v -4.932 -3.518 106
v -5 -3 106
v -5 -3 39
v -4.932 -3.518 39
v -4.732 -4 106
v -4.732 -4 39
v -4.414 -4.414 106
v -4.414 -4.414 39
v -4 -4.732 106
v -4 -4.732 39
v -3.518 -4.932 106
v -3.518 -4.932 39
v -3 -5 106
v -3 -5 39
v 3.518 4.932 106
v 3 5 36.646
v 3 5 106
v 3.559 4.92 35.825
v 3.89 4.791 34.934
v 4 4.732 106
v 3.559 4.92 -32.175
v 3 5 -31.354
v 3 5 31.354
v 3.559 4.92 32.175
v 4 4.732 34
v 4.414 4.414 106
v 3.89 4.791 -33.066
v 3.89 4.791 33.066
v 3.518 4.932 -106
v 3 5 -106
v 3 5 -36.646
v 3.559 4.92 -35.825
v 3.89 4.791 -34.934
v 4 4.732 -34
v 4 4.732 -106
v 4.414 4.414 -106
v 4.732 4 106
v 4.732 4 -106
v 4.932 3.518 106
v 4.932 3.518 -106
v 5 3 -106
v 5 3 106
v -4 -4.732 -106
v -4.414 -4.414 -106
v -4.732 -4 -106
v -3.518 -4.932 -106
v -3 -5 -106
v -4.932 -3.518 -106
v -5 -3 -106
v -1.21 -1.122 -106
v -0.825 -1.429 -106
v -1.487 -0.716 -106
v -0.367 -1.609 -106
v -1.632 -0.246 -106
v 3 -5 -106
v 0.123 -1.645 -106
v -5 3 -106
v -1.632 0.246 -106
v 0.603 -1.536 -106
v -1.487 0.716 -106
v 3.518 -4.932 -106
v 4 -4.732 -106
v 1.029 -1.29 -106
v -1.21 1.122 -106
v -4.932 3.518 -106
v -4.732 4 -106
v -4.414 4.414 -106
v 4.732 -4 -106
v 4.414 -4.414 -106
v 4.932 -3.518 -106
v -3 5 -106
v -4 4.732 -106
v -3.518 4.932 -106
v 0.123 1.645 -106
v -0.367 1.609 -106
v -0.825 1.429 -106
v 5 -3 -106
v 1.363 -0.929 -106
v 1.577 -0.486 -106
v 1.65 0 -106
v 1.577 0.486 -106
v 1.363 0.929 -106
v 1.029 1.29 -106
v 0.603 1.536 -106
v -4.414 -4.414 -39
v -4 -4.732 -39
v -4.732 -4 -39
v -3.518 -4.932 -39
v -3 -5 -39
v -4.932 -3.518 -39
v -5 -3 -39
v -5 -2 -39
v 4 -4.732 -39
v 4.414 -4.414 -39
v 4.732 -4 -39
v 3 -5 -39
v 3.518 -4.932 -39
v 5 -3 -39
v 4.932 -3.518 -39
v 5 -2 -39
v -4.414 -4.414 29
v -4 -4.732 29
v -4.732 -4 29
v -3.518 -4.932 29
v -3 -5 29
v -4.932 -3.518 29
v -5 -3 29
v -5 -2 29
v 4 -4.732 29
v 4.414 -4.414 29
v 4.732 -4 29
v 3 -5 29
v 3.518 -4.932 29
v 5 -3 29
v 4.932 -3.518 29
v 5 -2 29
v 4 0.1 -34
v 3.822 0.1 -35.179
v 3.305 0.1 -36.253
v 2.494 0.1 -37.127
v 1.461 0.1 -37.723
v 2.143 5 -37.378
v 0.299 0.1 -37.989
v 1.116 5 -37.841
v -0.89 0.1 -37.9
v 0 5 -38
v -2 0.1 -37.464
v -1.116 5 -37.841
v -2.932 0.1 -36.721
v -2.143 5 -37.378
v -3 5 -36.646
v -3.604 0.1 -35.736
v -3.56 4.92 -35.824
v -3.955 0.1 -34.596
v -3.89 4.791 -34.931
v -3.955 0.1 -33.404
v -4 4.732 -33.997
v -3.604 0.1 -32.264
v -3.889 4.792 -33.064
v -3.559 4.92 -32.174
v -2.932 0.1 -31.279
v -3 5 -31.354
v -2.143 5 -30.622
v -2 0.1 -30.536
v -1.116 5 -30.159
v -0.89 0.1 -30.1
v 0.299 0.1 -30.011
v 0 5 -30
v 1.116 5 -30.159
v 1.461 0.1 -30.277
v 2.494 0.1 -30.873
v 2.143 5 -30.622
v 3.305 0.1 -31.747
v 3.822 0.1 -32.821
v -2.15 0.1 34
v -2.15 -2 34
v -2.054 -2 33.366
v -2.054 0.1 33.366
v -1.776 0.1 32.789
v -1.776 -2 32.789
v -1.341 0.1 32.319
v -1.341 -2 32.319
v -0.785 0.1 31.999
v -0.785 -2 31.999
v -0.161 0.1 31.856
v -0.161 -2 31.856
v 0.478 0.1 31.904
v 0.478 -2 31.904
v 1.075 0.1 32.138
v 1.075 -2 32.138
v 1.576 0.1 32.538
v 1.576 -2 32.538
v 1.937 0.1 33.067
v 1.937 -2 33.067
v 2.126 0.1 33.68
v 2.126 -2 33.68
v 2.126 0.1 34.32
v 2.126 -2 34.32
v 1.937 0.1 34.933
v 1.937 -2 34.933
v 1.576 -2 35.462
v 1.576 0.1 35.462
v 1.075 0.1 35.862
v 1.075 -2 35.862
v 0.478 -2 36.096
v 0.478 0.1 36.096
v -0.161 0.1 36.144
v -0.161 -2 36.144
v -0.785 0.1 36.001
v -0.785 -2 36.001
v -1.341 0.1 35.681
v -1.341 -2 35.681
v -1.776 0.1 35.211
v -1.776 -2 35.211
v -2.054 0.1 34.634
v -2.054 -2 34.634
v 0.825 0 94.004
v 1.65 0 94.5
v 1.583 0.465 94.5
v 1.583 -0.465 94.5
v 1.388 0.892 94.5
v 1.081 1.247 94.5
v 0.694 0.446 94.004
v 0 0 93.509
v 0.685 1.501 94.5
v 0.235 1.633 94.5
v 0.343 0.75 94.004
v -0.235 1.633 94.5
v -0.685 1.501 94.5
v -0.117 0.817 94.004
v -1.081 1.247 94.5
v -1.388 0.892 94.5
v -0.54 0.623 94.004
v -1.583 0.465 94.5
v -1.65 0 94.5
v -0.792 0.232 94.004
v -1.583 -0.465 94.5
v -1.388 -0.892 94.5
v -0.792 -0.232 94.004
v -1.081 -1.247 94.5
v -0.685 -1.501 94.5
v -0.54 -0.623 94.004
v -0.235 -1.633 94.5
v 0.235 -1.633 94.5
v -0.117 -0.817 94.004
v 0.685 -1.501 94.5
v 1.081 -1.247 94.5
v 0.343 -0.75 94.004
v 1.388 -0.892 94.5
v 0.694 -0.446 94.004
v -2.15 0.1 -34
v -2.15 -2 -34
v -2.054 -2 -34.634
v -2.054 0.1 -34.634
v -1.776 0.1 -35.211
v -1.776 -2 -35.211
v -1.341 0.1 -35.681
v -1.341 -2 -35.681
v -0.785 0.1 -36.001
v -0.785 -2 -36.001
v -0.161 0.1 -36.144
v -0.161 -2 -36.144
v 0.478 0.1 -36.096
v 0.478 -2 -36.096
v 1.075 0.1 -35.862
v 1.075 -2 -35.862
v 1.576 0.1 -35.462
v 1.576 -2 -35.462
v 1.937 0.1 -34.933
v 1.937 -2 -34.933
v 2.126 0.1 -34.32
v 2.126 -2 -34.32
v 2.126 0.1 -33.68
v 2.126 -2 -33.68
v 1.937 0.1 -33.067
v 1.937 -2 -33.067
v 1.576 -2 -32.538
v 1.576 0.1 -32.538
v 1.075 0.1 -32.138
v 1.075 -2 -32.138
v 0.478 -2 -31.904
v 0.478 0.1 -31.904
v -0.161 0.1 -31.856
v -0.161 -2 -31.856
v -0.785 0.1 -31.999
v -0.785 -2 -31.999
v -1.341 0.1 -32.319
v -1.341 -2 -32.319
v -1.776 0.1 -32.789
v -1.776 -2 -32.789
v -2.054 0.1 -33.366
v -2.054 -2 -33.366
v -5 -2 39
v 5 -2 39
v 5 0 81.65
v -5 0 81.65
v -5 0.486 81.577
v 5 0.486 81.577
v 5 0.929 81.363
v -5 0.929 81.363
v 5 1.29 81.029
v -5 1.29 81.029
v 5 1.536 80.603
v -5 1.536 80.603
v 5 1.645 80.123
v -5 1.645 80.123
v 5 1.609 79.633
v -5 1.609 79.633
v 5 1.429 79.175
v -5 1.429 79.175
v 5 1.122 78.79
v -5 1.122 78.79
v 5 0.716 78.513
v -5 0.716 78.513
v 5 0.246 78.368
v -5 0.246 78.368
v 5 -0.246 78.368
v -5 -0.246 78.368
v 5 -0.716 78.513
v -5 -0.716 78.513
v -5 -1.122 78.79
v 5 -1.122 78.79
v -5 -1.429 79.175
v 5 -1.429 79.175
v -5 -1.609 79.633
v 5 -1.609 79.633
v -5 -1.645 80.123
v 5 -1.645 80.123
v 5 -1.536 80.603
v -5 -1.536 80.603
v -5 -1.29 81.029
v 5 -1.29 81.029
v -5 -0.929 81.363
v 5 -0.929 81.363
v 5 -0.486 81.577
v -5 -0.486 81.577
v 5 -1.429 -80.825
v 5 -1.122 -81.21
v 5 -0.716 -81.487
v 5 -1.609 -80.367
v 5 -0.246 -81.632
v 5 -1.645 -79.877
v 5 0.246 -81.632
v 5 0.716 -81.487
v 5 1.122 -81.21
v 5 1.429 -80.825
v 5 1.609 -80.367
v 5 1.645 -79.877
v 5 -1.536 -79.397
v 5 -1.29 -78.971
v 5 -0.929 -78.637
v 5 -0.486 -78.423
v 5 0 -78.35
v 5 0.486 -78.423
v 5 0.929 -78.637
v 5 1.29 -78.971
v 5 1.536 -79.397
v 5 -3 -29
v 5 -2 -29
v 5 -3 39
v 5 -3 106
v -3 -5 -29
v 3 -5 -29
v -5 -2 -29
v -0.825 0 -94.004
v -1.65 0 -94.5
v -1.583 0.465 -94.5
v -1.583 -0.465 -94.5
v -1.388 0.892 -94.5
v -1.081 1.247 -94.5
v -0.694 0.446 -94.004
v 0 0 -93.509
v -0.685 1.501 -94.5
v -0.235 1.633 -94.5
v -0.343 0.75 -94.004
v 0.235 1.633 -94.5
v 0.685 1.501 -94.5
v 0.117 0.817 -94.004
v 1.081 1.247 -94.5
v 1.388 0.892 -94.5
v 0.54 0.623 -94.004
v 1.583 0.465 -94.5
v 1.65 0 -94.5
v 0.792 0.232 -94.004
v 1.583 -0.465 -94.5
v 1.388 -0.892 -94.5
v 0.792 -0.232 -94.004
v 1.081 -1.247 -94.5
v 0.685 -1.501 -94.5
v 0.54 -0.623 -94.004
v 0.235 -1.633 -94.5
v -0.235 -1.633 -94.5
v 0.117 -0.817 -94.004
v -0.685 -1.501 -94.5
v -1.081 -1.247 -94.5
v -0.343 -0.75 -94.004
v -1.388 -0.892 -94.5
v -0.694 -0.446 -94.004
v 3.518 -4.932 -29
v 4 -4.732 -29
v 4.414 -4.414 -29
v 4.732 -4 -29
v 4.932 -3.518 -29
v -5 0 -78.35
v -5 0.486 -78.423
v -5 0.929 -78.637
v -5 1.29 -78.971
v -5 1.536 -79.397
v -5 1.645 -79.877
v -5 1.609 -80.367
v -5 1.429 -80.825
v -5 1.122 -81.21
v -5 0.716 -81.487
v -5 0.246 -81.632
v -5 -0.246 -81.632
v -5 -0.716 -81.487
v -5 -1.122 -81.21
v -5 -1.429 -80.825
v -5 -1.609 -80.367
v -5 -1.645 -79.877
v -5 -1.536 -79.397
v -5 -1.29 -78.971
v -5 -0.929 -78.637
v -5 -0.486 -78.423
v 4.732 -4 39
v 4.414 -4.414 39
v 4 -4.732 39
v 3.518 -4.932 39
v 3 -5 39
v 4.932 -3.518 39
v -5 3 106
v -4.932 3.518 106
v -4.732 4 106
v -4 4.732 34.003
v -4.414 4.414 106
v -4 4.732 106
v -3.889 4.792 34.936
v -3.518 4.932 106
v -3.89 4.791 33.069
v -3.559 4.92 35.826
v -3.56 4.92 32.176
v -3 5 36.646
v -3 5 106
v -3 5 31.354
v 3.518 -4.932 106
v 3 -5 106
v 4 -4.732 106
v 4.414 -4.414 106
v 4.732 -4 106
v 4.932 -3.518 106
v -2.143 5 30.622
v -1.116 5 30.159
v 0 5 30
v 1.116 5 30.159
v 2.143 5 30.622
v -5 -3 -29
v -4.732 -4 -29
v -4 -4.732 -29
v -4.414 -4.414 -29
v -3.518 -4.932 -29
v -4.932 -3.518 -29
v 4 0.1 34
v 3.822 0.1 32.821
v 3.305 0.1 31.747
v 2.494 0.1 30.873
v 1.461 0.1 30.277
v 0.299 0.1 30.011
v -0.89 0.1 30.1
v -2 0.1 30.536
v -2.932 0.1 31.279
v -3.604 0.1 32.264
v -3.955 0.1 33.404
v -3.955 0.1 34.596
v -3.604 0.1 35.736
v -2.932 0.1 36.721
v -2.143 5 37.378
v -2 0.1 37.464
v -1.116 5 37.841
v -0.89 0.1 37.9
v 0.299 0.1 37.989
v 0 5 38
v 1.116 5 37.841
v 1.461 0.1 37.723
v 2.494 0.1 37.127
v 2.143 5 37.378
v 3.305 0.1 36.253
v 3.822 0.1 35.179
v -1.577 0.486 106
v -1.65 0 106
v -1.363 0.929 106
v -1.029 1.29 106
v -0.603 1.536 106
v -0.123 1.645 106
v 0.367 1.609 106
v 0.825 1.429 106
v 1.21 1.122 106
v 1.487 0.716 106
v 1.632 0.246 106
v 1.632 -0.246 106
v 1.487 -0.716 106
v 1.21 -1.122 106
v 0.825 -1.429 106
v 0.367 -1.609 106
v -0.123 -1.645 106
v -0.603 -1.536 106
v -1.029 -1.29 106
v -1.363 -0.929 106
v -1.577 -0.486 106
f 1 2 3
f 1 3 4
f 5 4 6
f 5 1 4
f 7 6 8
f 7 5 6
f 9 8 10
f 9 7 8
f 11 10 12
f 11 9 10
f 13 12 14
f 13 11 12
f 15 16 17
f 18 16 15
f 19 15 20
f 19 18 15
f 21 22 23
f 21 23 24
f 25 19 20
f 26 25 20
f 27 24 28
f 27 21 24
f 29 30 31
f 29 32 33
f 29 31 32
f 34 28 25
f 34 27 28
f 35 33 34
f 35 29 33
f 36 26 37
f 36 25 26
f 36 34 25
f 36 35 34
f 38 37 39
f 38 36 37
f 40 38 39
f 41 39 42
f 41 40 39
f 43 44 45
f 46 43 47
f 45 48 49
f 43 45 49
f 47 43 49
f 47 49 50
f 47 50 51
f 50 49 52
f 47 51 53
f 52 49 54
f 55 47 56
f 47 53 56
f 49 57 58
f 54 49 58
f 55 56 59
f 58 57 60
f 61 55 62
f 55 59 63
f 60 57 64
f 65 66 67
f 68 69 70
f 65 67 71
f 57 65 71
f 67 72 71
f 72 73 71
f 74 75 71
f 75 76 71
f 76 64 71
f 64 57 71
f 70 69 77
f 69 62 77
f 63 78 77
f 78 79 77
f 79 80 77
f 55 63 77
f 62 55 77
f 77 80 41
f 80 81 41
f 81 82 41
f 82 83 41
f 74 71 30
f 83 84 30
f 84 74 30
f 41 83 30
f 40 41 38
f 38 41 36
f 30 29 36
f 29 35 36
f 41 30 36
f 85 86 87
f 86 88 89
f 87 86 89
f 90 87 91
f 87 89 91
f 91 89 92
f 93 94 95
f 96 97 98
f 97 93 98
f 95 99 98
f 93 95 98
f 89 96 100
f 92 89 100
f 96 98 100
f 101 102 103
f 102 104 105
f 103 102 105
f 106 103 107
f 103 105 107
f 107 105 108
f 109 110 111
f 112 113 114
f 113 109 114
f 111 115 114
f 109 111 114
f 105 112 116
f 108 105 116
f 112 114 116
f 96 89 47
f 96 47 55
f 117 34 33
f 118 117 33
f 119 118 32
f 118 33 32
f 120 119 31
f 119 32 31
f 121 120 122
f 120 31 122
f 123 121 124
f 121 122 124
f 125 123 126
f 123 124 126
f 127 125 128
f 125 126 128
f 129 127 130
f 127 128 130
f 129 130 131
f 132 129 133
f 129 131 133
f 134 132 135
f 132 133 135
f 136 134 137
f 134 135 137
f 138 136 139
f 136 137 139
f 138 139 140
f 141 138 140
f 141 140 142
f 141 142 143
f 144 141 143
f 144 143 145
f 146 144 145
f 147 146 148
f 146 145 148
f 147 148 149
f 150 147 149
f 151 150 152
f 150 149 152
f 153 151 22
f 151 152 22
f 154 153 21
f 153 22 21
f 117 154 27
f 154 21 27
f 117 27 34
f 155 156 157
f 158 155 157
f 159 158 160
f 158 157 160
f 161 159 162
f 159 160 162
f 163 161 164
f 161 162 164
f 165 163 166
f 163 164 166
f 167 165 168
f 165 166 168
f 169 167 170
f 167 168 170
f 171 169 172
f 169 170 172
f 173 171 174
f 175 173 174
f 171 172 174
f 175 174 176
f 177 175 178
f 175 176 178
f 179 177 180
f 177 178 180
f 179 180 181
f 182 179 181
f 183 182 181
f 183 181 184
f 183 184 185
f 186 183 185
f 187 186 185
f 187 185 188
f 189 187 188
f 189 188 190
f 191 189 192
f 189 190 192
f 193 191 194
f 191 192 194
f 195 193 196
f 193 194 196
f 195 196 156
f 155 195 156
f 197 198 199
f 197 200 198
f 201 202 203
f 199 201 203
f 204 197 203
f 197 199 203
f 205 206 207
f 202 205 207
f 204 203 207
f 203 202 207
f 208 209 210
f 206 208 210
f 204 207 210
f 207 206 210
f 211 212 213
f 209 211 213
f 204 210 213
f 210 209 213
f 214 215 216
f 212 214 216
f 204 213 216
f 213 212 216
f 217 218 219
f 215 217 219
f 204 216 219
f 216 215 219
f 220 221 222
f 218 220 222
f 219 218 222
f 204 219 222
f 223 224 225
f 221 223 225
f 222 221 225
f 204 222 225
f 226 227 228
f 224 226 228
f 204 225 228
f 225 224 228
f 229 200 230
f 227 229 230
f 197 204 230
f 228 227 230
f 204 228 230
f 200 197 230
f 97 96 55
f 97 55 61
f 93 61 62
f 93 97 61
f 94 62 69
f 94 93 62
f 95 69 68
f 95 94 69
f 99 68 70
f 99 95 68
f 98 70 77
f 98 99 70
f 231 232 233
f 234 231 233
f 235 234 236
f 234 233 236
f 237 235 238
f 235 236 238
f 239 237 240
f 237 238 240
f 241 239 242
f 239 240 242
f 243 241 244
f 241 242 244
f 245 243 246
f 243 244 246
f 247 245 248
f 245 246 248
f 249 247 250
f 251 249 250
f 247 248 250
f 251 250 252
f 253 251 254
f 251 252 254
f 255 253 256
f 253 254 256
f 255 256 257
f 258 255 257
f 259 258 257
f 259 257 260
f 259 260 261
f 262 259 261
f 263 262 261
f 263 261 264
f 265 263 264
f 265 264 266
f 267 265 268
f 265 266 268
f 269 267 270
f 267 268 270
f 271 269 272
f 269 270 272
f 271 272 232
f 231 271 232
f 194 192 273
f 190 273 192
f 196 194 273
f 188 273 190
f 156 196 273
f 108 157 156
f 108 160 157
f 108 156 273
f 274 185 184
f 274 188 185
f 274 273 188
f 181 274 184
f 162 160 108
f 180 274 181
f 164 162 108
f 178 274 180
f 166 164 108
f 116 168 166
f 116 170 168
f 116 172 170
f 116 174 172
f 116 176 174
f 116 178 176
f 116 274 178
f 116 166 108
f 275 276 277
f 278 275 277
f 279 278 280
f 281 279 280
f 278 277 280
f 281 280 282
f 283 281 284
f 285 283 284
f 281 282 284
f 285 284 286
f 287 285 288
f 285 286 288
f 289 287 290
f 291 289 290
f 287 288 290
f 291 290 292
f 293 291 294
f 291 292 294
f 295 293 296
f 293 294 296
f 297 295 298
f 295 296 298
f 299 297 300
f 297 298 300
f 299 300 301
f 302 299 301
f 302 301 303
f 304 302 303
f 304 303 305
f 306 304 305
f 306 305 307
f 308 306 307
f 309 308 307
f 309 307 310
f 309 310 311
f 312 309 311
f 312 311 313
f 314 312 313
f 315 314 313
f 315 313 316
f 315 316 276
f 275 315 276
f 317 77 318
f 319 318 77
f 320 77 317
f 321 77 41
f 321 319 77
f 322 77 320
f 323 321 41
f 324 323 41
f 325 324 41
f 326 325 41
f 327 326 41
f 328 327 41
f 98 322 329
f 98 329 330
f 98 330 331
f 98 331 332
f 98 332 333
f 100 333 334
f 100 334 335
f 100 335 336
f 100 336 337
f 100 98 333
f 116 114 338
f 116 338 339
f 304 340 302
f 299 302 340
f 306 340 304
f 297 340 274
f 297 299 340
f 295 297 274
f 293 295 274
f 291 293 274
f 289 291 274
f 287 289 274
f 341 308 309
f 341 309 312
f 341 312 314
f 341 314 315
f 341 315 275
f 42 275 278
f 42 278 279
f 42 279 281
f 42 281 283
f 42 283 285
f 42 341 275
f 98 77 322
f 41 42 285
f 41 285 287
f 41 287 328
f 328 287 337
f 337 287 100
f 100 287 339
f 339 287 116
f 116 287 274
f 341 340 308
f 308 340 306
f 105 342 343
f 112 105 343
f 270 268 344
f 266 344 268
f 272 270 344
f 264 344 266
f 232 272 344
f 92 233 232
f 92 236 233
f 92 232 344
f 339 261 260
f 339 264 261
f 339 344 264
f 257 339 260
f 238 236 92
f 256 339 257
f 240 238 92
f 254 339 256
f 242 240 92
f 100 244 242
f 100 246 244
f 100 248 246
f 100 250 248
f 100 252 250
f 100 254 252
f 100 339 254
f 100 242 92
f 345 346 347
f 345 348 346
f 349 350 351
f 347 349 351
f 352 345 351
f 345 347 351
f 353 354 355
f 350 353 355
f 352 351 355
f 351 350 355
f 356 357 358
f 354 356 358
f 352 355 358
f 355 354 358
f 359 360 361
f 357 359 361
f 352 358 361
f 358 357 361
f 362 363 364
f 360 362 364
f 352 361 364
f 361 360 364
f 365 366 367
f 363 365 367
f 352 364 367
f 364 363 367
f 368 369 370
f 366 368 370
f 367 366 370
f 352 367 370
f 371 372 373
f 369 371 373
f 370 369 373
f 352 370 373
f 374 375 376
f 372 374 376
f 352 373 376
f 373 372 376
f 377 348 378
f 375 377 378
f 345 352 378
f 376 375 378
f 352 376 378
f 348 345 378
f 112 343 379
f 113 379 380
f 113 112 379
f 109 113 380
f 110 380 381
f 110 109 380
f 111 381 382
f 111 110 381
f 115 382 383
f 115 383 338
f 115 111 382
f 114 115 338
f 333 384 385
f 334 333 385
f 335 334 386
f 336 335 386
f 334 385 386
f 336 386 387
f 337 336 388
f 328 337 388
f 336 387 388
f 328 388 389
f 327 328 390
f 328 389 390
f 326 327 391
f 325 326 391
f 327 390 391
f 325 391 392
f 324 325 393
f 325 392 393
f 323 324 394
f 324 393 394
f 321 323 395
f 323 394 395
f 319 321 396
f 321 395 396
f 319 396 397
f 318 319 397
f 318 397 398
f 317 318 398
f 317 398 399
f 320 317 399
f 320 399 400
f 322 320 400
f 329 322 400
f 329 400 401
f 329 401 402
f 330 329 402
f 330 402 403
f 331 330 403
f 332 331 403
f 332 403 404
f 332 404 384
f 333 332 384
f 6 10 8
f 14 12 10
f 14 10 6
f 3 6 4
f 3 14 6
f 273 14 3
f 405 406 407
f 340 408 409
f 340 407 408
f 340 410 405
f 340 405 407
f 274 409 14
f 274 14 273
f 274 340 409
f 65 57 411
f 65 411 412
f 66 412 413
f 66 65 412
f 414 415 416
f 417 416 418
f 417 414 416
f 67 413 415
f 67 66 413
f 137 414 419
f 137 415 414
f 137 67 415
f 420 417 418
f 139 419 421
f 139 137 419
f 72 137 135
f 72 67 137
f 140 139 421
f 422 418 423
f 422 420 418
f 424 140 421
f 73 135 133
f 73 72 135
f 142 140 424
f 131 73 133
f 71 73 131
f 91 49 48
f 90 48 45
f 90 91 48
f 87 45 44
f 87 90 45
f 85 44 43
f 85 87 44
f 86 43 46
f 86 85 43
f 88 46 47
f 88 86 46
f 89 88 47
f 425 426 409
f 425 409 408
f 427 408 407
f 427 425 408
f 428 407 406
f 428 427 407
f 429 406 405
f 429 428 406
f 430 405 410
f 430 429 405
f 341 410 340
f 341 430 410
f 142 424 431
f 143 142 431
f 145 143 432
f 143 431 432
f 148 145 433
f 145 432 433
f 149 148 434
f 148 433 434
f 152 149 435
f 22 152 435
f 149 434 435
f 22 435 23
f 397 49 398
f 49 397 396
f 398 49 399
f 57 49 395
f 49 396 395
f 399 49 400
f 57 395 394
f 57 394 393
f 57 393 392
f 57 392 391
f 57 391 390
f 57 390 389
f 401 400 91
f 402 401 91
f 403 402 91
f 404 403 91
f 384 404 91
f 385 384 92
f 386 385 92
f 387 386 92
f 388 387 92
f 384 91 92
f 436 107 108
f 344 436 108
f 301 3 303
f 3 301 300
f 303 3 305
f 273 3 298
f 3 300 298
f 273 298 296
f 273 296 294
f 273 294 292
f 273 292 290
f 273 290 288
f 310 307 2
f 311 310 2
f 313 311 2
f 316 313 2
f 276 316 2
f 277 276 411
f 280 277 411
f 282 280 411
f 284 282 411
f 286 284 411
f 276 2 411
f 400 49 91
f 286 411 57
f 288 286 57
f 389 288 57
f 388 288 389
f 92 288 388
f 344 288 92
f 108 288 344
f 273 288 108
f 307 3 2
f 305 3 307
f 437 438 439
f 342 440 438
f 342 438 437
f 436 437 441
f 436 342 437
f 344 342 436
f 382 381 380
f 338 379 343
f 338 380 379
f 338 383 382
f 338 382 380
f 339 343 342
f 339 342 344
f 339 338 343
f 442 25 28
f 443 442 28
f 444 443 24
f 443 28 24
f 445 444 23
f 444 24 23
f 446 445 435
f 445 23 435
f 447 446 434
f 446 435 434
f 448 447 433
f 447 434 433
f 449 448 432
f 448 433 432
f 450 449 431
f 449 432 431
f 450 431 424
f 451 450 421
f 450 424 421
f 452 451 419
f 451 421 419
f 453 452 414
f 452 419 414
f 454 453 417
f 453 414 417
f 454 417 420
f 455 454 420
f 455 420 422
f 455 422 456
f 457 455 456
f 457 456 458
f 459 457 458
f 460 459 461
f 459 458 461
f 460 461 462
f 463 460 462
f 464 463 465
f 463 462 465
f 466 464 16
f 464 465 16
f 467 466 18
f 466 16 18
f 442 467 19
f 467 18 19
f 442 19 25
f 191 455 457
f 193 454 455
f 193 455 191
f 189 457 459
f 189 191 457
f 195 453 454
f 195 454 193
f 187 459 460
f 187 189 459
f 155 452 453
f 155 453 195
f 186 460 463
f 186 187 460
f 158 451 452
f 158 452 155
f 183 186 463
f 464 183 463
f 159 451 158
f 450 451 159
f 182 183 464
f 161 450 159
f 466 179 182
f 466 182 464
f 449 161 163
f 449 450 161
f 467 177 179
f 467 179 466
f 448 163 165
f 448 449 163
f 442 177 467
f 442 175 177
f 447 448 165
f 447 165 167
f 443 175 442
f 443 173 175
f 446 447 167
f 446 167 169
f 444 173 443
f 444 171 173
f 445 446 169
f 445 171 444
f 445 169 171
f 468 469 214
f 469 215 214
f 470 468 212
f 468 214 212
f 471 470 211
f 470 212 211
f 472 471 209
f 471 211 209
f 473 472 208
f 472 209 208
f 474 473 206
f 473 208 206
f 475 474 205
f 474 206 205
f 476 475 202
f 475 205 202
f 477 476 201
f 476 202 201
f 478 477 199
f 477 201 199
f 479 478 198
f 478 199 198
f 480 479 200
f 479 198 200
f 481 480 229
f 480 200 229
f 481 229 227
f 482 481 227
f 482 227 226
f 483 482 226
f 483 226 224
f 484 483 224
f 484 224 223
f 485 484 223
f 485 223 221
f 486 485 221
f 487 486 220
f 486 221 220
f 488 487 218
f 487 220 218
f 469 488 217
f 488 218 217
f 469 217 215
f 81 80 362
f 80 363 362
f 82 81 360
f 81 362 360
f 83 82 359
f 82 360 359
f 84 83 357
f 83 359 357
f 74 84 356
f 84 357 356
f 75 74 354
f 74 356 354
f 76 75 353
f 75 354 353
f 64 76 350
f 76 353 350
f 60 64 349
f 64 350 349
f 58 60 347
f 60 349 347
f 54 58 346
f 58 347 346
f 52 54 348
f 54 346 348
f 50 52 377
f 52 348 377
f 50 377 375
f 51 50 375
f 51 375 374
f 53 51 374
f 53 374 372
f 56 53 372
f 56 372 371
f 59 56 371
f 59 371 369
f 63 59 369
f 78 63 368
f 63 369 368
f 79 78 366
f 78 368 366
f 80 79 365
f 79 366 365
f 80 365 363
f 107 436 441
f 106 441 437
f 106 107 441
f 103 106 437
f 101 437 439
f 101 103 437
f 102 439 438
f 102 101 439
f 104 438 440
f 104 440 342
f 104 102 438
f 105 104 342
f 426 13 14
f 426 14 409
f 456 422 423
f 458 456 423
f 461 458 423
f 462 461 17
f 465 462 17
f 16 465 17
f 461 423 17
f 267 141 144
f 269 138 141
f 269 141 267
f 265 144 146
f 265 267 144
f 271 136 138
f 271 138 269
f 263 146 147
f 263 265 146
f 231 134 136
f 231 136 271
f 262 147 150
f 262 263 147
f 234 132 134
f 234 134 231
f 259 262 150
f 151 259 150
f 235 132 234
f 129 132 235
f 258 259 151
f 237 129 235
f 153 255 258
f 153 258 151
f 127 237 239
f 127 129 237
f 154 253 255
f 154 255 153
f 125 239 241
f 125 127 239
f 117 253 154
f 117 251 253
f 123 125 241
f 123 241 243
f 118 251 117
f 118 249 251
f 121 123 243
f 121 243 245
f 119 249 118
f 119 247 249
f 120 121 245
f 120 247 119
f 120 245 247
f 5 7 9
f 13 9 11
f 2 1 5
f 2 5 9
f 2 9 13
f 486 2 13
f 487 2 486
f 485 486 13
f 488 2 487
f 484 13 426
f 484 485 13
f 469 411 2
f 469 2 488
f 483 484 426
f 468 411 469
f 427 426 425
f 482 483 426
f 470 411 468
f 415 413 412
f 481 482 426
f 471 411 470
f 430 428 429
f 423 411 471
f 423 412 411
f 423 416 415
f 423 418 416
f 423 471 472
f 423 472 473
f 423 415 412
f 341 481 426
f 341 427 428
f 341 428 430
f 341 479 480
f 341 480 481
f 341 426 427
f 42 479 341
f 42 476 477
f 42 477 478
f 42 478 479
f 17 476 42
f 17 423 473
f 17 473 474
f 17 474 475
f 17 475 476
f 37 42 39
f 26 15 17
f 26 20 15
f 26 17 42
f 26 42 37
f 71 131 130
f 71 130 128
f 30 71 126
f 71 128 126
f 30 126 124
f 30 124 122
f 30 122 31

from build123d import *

# Parameters (mm, degrees)
ESQUISSE1_W                                        = 10
ESQUISSE1_H                                        = 10
BOSS_EXTRU_1_DEPTH                                 = 106
TROU_TARAUD_M41_D                                  = 3.3
TROU_TARAUD_M41_DEPTH                              = 11.5
TROU_TARAUD_M41_TIP                                = 0.991420021
TROU_TARAUD_M42_D                                  = 3.3
TROU_TARAUD_M42_DEPTH                              = 11.5
TROU_TARAUD_M42_TIP                                = 0.991420021
CONG_1_R                                           = 2
CHAMBRAGE_POUR_VIS_T_TE_HEXAGONALE_M41_D           = 4.3
CHAMBRAGE_POUR_VIS_T_TE_HEXAGONALE_M41_CBORE_D     = 8
CHAMBRAGE_POUR_VIS_T_TE_HEXAGONALE_M41_CBORE_DEPTH = 4.9
ENL_V_MAT_EXTRU_1_REACH                            = 108.588
ESQUISSE8_W                                        = 10
ESQUISSE8_H                                        = 8
TROU_TARAUD_M44_D                                  = 3.3


with BuildPart() as part:
    # Esquisse1 → Boss.-Extru.1 (new, symmetric)
    with BuildSketch(Plane.XY):
        Rectangle(ESQUISSE1_W, ESQUISSE1_H)
    extrude(amount=BOSS_EXTRU_1_DEPTH, both=True)

    # Trou taraudé M41
    with Locations(Plane.XY.offset(106)):
        with Locations((0, 0)):
            Hole(TROU_TARAUD_M41_D / 2, depth=TROU_TARAUD_M41_DEPTH)
            with Locations((0, 0, -(TROU_TARAUD_M41_DEPTH + TROU_TARAUD_M41_TIP / 2))):  # 118° drill point
                Cone(0, TROU_TARAUD_M41_D / 2, TROU_TARAUD_M41_TIP, mode=Mode.SUBTRACT)

    # Trou taraudé M42
    with Locations(Plane(origin=(0, 0, -106), x_dir=(-1, 0, 0), z_dir=(0, 0, -1))):
        with Locations((0, 0)):
            Hole(TROU_TARAUD_M42_D / 2, depth=TROU_TARAUD_M42_DEPTH)
            with Locations((0, 0, -(TROU_TARAUD_M42_DEPTH + TROU_TARAUD_M42_TIP / 2))):  # 118° drill point
                Cone(0, TROU_TARAUD_M42_D / 2, TROU_TARAUD_M42_TIP, mode=Mode.SUBTRACT)

    # Congé1
    cong_1_edges = [part.edges().sort_by_distance(p)[0] for p in [
        (-5, 5, 0),
        (5, 5, 0),
        (5, -5, 0),
        (-5, -5, 0),
    ]]
    fillet(cong_1_edges, radius=CONG_1_R)

    # Chambrage pour vis à tête hexagonale M41 (through all)
    with Locations(Plane(origin=(0, 5, 0), x_dir=(1, 0, 0), z_dir=(0, 1, 0))):
        with Locations((0, 34), (0, -34)):
            CounterBoreHole(CHAMBRAGE_POUR_VIS_T_TE_HEXAGONALE_M41_D / 2, CHAMBRAGE_POUR_VIS_T_TE_HEXAGONALE_M41_CBORE_D / 2, CHAMBRAGE_POUR_VIS_T_TE_HEXAGONALE_M41_CBORE_DEPTH)

    # Esquisse8 → Enlèv. mat.-Extru.1 (cut, up to next)
    with BuildSketch(Plane(origin=(5, 0, 0), x_dir=(0, 0, -1), z_dir=(1, 0, 0)), mode=Mode.PRIVATE) as enl_v_mat_extru_1_sk1:
        with Locations((34, -6)):
            Rectangle(ESQUISSE8_W, ESQUISSE8_H)
    enl_v_mat_extru_1_tool1 = extrude(enl_v_mat_extru_1_sk1.sketch, amount=-ENL_V_MAT_EXTRU_1_REACH, mode=Mode.PRIVATE) & part.part
    # Esquisse8 → Enlèv. mat.-Extru.1 (cut, up to next)
    with BuildSketch(Plane(origin=(5, 0, 0), x_dir=(0, 0, -1), z_dir=(1, 0, 0)), mode=Mode.PRIVATE) as enl_v_mat_extru_1_sk2:
        with Locations((-34, -6)):
            Rectangle(ESQUISSE8_W, ESQUISSE8_H)
    enl_v_mat_extru_1_tool2 = extrude(enl_v_mat_extru_1_sk2.sketch, amount=-ENL_V_MAT_EXTRU_1_REACH, mode=Mode.PRIVATE) & part.part
    add(enl_v_mat_extru_1_tool1.solids().sort_by_distance((5, -6, -34))[0], mode=Mode.SUBTRACT)
    add(enl_v_mat_extru_1_tool2.solids().sort_by_distance((5, -6, 34))[0], mode=Mode.SUBTRACT)

    # Trou taraudé M44 (through all)
    with Locations(Plane(origin=(5, 0, 0), x_dir=(0, 0, -1), z_dir=(1, 0, 0))):
        with Locations((-80, 0), (80, 0)):
            Hole(TROU_TARAUD_M44_D / 2)


solid = part.part
